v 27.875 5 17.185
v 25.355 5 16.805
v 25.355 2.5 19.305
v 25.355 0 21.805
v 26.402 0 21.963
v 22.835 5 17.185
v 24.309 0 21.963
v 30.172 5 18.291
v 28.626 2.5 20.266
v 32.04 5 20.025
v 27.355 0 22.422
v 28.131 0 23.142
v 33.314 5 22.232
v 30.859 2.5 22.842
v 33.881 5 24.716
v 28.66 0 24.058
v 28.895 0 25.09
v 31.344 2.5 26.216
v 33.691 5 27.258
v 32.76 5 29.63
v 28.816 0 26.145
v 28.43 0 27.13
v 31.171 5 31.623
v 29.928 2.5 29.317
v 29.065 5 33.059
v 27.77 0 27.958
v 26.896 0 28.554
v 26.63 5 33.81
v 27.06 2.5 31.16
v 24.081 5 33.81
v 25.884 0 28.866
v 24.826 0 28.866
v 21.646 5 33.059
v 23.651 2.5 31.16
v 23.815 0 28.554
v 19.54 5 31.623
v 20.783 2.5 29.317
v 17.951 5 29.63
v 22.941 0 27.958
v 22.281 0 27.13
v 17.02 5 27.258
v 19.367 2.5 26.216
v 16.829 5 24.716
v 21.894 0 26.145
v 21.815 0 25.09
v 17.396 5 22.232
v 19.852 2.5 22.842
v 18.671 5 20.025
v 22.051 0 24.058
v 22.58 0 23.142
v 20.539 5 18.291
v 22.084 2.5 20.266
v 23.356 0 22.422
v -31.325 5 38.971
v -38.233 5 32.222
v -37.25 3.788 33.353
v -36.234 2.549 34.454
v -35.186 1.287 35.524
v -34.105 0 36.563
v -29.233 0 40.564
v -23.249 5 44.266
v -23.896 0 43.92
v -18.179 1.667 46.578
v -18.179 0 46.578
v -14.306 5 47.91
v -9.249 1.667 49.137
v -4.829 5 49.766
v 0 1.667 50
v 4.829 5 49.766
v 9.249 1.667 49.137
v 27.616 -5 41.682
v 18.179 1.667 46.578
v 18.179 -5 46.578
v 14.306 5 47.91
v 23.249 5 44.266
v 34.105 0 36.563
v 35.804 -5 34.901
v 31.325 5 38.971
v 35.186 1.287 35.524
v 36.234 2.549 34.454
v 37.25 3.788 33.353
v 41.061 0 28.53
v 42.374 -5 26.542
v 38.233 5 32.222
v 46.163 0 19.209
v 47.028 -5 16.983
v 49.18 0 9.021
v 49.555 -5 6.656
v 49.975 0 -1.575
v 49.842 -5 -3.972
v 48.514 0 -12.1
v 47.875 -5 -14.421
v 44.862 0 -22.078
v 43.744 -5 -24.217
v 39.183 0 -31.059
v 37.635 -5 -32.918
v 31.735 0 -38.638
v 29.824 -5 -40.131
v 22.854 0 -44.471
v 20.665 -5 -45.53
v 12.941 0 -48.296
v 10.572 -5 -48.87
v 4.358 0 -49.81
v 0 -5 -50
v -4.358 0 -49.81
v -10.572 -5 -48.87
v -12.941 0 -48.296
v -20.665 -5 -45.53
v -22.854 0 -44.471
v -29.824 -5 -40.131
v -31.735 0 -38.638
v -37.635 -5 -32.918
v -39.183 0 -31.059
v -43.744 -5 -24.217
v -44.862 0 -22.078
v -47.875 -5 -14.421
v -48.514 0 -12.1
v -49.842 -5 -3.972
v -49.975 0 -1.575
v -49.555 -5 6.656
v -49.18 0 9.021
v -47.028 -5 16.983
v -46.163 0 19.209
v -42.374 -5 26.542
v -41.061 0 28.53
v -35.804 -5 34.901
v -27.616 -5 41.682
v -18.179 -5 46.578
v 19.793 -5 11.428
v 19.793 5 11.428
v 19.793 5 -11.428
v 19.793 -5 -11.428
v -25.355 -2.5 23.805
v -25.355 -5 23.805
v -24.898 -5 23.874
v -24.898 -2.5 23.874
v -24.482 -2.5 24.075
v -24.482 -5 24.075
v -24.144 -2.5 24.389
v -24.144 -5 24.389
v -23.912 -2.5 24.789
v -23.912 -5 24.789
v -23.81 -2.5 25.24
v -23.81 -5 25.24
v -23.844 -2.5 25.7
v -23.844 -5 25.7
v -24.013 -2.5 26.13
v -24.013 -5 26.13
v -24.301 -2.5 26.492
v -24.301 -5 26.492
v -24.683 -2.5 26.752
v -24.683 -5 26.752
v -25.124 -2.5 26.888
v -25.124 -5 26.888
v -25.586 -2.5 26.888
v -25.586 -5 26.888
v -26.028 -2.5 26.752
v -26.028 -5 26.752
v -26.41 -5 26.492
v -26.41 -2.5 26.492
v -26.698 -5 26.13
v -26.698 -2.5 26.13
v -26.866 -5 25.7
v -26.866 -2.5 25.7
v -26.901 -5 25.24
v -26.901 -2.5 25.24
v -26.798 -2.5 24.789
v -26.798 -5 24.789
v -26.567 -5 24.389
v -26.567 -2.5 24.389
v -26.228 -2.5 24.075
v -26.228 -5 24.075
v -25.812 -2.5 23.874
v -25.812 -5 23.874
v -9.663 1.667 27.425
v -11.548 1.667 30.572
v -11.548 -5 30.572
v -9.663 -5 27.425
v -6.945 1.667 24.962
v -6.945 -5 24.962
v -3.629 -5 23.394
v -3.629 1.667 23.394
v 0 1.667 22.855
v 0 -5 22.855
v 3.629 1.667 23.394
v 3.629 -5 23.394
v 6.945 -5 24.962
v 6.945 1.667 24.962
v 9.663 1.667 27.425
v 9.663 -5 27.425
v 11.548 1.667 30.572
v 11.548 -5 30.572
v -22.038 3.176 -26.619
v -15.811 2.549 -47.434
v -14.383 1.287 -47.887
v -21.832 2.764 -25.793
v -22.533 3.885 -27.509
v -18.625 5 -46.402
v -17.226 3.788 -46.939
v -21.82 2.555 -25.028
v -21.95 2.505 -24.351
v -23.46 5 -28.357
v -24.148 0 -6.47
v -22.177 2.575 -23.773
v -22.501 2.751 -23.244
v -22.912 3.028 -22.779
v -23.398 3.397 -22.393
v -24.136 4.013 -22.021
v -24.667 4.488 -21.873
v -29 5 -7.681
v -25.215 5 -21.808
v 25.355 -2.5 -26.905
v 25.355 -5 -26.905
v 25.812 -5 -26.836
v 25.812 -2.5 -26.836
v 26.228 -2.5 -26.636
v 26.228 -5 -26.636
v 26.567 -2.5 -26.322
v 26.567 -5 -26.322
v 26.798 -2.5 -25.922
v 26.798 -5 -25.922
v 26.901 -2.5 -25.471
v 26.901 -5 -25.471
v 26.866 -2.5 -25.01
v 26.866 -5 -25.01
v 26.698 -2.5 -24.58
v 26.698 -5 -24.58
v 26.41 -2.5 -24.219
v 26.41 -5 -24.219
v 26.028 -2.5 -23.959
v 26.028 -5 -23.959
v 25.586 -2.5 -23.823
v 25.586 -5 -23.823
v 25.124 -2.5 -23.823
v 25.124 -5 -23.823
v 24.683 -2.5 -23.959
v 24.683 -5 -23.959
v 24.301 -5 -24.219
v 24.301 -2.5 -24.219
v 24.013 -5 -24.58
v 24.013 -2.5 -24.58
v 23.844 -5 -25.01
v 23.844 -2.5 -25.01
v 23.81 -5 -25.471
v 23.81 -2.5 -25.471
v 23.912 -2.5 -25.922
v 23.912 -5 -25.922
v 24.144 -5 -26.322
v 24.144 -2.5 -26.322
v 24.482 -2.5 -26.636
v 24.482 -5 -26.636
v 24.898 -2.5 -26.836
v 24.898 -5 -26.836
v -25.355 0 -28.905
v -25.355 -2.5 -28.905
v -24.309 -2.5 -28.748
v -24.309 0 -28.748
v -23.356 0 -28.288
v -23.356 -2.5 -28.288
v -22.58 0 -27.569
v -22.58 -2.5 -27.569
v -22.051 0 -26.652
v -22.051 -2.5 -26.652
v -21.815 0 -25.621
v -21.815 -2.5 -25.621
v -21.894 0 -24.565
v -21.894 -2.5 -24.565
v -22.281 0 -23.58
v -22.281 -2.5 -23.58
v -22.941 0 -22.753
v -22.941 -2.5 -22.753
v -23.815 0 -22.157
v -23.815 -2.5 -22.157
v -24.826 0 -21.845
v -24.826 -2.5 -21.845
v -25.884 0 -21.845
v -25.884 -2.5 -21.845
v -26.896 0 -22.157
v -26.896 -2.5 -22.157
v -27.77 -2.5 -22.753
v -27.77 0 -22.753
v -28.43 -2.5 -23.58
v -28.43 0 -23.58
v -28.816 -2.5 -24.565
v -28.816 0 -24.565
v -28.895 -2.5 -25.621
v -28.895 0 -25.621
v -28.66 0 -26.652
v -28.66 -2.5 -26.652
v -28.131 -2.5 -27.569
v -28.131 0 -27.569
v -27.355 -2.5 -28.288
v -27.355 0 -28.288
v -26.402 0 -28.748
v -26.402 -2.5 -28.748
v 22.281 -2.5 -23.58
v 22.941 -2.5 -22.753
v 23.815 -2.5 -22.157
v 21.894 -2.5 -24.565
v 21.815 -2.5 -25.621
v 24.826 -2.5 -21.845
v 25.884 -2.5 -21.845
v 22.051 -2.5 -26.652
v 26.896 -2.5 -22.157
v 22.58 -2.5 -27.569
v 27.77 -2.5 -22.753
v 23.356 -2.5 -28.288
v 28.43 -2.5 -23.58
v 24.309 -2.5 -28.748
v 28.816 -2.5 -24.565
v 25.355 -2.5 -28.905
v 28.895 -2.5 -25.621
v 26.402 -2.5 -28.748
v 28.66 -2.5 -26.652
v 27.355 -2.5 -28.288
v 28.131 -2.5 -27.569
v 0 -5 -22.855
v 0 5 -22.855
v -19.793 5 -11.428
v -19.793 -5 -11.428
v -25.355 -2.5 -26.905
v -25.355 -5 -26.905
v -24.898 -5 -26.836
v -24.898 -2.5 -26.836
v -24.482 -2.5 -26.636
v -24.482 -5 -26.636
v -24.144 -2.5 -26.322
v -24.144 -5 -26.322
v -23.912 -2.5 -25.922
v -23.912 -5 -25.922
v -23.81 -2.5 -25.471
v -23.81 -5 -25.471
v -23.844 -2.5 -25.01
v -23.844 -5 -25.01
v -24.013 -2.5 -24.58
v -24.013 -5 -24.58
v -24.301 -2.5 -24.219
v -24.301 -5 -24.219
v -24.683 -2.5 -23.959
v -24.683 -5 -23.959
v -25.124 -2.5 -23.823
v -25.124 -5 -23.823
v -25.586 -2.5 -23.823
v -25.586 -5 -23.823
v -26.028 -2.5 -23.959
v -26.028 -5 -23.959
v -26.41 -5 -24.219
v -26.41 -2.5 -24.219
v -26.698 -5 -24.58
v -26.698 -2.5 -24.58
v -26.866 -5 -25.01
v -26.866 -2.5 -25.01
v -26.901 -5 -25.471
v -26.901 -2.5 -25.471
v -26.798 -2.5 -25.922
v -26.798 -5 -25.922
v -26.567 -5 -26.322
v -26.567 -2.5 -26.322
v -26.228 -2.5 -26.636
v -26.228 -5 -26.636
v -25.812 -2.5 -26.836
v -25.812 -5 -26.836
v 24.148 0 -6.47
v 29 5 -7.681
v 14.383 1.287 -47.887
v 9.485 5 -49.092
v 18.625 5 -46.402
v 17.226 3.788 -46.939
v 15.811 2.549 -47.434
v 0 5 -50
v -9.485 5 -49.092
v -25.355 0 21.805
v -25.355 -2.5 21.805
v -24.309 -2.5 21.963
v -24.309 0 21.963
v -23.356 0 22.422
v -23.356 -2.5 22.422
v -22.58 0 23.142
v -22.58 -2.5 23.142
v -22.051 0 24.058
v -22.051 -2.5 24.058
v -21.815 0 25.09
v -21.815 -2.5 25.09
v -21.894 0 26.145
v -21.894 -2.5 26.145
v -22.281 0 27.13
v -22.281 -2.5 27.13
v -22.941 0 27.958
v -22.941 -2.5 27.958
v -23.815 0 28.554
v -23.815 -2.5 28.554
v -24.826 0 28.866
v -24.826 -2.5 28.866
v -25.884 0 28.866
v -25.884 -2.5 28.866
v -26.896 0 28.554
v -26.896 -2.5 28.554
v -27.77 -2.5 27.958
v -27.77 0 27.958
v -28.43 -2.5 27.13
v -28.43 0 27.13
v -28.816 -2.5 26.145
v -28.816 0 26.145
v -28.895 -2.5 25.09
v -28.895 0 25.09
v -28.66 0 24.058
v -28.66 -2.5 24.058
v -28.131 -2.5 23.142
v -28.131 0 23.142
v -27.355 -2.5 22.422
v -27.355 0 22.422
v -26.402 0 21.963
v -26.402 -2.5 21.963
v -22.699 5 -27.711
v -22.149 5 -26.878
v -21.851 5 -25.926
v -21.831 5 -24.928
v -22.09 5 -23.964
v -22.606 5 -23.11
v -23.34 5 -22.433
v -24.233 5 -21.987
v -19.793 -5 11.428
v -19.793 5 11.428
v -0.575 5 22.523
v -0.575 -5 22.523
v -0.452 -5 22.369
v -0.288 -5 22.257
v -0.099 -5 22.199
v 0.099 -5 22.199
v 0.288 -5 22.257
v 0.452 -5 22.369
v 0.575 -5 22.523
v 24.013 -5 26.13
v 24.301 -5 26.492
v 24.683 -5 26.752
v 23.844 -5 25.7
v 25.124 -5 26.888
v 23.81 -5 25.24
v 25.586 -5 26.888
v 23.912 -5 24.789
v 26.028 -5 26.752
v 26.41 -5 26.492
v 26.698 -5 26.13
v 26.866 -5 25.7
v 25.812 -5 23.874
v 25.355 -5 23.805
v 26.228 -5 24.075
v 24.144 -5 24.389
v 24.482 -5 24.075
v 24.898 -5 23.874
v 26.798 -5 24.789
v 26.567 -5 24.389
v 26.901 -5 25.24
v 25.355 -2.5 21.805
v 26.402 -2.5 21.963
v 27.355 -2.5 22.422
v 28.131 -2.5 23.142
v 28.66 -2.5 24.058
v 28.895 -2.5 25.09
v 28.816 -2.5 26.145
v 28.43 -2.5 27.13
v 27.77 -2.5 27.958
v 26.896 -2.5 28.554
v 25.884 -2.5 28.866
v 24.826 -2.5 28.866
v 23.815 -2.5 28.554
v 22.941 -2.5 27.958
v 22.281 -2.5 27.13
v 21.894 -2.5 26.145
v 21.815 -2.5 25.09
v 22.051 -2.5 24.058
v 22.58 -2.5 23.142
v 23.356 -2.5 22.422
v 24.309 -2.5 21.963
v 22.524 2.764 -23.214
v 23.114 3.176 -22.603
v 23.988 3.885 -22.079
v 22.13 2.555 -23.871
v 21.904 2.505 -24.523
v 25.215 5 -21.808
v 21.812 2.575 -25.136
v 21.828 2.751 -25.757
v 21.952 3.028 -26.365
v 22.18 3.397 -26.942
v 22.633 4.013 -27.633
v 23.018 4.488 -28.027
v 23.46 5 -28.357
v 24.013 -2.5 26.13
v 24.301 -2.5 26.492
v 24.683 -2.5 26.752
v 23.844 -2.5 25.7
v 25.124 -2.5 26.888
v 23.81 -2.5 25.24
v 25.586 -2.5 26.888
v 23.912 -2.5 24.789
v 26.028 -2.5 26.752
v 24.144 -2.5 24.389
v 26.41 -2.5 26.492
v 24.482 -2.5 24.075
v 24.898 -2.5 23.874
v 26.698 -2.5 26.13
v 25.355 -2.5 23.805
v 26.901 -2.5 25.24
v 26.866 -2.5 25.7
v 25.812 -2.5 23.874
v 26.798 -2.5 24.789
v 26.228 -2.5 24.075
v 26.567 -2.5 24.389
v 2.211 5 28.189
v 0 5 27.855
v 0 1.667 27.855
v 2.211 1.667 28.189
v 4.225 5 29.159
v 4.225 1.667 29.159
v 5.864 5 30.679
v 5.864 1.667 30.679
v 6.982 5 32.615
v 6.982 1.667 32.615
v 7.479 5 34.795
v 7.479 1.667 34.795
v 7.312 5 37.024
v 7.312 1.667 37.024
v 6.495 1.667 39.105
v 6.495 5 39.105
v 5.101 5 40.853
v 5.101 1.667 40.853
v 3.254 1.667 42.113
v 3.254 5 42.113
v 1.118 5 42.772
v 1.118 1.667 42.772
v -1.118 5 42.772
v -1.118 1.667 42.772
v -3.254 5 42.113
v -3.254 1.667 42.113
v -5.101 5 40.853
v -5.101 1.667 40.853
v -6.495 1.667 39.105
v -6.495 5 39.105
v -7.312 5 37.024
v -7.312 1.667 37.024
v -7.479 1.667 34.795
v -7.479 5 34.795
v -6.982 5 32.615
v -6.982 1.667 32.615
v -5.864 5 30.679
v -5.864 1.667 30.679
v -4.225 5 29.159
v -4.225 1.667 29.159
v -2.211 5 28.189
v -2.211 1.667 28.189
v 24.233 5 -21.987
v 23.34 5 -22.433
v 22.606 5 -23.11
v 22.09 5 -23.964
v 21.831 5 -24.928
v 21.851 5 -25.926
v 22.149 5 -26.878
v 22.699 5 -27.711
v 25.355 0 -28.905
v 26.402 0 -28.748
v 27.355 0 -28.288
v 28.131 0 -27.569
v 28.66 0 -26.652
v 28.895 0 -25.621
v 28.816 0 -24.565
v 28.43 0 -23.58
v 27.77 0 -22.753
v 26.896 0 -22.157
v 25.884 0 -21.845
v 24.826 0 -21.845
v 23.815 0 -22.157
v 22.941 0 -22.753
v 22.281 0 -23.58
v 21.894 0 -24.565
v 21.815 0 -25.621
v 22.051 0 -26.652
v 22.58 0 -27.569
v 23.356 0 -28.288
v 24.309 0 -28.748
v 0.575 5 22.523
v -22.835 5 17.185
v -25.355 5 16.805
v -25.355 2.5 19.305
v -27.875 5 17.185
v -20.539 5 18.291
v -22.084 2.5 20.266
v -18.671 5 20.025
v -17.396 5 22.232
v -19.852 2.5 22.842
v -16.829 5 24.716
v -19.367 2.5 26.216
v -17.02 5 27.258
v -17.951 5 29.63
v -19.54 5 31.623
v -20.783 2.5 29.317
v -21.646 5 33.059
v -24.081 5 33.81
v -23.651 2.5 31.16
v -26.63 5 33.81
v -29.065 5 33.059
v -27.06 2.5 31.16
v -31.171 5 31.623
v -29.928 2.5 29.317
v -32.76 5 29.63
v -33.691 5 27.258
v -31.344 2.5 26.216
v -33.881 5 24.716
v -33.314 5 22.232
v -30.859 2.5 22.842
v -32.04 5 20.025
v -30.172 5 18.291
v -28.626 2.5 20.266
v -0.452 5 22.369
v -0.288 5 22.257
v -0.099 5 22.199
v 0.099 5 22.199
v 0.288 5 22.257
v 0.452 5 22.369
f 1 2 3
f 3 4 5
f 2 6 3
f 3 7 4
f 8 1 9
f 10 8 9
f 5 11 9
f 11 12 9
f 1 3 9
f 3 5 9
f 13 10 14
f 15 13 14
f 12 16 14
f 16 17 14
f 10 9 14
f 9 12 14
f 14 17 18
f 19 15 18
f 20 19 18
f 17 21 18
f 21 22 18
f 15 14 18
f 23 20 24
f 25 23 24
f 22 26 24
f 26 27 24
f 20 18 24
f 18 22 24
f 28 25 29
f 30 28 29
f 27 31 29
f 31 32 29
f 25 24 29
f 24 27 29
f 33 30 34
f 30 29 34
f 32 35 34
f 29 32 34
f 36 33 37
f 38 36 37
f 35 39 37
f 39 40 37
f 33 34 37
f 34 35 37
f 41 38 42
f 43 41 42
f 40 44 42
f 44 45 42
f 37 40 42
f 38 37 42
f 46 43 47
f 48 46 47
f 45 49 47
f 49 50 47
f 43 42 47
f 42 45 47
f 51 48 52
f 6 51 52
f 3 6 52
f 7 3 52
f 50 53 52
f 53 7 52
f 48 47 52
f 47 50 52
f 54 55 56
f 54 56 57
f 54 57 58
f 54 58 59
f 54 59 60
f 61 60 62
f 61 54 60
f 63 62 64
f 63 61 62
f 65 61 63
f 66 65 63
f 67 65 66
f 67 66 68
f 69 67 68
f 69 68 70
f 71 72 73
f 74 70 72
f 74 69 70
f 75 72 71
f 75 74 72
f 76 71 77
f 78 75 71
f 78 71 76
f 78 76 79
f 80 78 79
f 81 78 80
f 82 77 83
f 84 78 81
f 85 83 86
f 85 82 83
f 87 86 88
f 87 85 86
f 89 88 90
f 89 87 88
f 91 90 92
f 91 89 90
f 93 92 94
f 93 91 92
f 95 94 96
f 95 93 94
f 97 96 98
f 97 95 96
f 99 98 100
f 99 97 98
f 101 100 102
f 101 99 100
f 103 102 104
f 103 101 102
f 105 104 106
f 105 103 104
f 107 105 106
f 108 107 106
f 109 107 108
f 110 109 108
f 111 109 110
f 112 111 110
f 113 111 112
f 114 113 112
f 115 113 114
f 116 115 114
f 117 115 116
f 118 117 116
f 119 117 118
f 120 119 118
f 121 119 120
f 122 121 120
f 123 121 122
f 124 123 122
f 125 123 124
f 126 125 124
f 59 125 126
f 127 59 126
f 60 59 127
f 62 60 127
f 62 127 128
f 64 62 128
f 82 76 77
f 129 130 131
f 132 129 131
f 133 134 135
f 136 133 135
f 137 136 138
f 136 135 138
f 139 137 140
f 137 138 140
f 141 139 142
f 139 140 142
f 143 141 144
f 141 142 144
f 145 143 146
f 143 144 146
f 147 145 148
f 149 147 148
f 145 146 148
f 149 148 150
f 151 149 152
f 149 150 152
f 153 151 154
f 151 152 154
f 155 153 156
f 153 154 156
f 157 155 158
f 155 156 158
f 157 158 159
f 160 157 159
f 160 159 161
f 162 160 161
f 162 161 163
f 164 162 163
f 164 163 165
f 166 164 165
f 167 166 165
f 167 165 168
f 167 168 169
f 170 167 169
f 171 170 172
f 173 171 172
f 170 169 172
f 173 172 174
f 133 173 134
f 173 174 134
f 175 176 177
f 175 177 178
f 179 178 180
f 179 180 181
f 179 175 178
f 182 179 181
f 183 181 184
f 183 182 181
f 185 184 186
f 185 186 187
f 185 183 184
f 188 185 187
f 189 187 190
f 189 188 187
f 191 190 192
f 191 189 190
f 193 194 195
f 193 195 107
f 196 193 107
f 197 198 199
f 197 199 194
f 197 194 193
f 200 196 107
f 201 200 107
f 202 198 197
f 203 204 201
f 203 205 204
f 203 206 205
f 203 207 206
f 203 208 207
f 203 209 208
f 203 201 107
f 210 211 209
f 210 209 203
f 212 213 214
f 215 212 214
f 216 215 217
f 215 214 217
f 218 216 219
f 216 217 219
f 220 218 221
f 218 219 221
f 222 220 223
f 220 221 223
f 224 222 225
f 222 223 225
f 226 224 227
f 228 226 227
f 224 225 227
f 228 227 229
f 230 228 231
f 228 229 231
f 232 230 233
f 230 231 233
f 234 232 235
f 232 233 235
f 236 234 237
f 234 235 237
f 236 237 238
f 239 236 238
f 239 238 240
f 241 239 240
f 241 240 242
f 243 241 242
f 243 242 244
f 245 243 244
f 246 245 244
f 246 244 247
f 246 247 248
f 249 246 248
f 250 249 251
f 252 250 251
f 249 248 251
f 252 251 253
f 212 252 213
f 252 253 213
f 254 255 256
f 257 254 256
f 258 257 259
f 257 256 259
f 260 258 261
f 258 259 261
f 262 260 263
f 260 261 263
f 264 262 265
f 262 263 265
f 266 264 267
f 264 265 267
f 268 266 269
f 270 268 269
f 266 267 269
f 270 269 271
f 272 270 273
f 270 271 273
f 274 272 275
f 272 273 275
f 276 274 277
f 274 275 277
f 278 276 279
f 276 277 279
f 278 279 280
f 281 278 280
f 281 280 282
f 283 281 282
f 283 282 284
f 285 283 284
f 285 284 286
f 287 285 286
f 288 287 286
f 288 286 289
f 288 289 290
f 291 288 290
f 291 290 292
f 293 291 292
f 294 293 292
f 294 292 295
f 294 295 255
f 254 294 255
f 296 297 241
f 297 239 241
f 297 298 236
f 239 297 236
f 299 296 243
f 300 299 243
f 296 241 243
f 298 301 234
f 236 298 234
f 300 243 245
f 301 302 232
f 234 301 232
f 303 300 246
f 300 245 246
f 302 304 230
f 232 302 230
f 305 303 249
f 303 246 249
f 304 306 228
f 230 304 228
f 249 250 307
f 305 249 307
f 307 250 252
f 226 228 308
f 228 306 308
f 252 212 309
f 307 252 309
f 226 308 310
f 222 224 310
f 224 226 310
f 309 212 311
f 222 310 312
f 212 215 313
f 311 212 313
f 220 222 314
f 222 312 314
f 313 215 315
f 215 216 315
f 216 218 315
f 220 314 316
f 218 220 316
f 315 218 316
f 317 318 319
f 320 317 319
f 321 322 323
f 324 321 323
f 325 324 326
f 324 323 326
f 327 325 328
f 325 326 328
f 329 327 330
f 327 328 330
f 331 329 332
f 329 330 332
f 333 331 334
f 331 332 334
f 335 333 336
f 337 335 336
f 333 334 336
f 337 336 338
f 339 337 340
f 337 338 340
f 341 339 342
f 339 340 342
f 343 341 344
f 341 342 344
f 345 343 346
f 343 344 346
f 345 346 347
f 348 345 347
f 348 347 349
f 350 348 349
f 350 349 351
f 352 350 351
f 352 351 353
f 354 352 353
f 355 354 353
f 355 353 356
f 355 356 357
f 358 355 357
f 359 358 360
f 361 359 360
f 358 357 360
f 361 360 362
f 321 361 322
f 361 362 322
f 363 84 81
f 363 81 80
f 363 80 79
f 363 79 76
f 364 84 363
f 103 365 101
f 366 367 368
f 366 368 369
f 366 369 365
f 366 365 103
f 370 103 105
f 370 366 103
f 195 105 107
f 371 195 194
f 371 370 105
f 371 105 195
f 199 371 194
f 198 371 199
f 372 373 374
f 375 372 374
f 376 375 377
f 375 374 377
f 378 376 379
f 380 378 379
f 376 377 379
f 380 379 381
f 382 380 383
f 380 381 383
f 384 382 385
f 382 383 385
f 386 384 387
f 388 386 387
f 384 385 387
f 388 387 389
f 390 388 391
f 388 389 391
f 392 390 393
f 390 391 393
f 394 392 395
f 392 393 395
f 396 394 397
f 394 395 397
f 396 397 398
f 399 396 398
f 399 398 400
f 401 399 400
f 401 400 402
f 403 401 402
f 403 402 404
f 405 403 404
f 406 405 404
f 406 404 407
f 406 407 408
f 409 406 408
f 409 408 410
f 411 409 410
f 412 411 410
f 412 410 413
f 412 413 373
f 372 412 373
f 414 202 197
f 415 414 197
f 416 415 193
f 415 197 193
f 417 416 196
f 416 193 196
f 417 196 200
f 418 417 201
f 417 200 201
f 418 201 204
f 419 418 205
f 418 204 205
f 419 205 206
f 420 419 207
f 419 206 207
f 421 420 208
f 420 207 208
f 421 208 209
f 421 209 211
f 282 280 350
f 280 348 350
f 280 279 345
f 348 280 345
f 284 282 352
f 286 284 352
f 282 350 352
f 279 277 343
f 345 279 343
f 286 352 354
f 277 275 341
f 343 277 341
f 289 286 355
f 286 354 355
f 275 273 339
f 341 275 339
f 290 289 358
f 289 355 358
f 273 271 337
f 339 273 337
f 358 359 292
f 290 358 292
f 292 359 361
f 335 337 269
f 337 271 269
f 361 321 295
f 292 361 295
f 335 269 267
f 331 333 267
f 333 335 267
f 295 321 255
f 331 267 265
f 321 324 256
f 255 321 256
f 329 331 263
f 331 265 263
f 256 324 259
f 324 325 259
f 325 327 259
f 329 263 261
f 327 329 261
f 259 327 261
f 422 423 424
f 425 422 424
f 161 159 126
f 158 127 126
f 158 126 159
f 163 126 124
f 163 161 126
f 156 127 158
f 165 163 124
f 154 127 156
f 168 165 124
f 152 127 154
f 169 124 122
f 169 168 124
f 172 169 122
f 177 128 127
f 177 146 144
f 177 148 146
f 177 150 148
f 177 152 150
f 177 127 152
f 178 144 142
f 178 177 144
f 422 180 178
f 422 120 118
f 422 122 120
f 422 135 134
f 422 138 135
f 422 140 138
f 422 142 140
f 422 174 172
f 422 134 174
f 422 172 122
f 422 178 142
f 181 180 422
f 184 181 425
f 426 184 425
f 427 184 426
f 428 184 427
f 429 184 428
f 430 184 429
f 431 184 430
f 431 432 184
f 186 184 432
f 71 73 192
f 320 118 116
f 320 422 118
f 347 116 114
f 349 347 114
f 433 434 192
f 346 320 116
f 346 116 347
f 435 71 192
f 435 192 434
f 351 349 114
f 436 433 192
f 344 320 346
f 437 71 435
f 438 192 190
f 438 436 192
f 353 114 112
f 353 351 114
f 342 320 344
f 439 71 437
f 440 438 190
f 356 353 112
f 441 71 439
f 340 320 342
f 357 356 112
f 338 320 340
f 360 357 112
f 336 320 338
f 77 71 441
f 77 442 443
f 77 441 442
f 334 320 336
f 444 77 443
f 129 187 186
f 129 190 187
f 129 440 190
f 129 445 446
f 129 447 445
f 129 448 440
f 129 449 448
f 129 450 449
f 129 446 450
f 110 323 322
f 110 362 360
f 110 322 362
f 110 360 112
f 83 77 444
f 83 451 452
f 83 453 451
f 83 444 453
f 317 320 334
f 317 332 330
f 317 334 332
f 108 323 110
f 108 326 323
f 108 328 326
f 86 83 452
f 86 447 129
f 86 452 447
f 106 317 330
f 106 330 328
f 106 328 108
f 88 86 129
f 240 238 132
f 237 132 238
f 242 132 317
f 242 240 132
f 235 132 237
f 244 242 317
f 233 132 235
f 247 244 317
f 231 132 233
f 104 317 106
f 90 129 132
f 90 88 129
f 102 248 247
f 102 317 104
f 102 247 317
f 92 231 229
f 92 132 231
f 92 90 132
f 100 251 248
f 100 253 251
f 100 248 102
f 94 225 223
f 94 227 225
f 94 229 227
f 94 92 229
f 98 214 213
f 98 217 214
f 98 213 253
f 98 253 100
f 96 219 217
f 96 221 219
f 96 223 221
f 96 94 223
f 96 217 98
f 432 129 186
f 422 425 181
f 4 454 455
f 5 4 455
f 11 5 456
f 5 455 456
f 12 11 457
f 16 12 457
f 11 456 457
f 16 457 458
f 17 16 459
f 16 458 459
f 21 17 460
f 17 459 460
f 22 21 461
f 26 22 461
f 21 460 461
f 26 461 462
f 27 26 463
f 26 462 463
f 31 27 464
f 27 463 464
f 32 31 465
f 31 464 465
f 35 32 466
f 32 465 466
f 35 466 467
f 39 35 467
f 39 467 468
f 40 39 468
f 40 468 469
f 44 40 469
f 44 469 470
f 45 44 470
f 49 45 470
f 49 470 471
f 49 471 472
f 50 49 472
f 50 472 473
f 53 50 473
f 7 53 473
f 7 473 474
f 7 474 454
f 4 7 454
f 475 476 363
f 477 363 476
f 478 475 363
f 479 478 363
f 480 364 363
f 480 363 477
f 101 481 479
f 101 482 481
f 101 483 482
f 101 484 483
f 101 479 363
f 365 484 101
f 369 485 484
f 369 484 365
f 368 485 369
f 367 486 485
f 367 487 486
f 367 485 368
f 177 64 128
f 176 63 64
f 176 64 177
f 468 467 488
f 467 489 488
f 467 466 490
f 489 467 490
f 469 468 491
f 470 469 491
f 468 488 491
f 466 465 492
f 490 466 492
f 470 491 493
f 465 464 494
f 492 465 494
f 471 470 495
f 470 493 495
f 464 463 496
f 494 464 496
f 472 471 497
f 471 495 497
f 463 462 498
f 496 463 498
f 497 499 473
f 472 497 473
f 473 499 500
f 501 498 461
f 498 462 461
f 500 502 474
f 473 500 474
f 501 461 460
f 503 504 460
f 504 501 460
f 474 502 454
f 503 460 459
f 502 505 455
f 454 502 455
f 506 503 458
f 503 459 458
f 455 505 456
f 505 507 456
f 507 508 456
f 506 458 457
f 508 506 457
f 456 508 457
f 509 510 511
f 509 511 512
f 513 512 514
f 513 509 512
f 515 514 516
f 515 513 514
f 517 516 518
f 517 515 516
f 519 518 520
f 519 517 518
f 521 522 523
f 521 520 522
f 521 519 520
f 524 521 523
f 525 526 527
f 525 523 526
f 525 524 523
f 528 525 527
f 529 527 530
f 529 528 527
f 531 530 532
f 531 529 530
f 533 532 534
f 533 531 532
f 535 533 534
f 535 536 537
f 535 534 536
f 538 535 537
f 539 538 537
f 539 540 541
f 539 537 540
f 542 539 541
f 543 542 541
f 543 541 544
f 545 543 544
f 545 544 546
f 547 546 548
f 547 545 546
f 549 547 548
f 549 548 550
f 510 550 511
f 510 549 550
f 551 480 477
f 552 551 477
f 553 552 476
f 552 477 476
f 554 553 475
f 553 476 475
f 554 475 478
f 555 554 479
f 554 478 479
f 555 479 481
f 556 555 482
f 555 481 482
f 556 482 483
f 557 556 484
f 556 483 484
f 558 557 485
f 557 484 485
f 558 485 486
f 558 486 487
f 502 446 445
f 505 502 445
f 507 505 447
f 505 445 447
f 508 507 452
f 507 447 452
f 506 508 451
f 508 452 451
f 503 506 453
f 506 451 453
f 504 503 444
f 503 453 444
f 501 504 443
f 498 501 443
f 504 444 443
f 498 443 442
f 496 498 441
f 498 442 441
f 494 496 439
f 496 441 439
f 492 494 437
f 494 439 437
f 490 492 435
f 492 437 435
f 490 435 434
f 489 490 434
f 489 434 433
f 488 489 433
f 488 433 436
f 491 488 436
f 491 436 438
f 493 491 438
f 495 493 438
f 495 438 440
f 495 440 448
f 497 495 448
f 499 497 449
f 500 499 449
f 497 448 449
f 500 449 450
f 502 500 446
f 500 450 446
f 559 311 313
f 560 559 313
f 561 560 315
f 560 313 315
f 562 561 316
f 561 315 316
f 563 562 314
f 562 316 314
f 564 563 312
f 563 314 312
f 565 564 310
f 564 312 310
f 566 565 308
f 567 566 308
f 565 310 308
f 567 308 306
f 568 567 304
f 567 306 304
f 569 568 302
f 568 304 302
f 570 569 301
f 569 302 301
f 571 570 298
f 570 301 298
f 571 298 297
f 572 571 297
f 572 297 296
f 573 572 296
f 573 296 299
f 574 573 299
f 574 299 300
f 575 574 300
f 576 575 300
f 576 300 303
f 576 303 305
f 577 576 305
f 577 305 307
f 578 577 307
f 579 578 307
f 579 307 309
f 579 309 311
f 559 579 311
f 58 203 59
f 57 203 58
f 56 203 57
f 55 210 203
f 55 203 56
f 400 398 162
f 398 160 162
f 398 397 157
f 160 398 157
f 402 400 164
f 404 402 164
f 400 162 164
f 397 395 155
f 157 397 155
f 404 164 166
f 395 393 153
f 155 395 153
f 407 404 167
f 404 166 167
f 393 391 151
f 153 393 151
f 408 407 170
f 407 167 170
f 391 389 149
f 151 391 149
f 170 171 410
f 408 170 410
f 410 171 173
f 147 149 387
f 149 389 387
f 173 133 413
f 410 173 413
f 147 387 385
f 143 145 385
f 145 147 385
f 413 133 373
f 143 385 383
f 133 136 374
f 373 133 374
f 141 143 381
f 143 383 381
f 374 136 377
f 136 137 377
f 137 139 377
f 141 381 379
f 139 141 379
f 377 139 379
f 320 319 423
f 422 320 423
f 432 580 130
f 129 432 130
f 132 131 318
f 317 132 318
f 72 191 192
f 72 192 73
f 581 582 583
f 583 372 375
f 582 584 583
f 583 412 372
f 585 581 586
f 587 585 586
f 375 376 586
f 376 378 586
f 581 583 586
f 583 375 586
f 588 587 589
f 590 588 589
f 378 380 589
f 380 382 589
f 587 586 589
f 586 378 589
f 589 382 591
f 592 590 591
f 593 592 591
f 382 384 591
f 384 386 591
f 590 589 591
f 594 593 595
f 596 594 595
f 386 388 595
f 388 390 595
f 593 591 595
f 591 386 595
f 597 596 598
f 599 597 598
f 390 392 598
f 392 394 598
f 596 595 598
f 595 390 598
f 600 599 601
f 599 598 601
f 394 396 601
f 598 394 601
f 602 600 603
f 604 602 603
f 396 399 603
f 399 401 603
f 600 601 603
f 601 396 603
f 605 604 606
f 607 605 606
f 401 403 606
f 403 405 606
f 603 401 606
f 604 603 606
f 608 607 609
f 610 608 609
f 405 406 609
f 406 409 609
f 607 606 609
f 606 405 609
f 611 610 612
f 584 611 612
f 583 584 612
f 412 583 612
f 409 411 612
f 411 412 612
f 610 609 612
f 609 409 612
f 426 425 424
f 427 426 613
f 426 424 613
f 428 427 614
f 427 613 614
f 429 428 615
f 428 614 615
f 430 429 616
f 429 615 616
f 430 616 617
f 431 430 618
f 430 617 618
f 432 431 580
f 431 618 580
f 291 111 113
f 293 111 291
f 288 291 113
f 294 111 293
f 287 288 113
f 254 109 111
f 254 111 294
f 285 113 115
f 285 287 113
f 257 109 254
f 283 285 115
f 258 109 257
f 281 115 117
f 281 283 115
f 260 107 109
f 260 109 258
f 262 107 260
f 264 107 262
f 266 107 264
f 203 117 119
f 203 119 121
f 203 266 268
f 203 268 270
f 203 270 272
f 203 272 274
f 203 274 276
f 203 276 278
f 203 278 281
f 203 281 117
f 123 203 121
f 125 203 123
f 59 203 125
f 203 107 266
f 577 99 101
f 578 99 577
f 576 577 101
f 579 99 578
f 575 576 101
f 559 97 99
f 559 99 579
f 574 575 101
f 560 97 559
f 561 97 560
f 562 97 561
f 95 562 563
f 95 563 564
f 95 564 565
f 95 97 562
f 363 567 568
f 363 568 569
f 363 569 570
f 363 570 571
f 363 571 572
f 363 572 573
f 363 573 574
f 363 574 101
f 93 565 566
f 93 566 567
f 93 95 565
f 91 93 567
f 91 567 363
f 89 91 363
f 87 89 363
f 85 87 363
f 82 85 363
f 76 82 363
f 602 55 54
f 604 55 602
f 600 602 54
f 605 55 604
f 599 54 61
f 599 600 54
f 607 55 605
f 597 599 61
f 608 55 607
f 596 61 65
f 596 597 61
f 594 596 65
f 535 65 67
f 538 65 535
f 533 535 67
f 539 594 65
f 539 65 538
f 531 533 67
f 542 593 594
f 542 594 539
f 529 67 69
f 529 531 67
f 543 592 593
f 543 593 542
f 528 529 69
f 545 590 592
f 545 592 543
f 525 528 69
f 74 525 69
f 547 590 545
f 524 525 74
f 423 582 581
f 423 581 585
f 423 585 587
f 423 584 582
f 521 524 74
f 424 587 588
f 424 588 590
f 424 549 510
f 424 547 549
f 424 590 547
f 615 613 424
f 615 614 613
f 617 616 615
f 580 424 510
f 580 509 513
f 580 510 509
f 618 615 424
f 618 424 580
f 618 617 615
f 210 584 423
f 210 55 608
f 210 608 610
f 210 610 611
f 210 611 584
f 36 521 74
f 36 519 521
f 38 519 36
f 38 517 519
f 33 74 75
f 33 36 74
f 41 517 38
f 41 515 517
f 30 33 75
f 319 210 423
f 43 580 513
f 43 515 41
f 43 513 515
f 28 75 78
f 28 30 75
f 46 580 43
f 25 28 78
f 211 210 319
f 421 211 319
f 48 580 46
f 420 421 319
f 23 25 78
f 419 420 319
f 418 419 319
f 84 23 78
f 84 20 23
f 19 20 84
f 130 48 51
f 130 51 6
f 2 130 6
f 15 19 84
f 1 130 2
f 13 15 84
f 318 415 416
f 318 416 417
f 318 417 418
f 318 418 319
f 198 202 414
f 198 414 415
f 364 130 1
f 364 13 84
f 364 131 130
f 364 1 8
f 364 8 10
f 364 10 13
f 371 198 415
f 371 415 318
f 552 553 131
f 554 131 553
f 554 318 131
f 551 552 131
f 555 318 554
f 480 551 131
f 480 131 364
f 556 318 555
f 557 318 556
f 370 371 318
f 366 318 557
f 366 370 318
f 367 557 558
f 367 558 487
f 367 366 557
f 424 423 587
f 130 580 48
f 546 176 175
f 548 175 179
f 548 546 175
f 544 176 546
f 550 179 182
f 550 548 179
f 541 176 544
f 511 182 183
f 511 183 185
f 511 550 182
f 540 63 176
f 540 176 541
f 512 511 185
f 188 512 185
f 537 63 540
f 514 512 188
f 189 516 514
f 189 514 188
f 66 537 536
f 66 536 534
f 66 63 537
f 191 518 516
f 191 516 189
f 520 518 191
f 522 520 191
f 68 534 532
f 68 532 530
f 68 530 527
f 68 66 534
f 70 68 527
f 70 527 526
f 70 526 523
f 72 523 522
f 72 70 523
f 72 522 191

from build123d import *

# Parameters (mm, degrees)
SKETCH1_R               = 50
BOSS_EXTRUDE1_DEPTH     = 5
BOSS_EXTRUDE3_START     = 5
BOSS_EXTRUDE3_DEPTH     = 5
DRAFT2_ANGLE            = -45
CUT_EXTRUDE3_DEPTH      = 72.414284285
CUT_EXTRUDE3_DEPTH_BACK = 72.414284285
SKETCH3_R               = 7.5
CUT_EXTRUDE5_START      = -6.666666667
CUT_EXTRUDE5_DEPTH      = 6.666666667
SKETCH5_R               = 3.55
SKETCH5_R_2             = 1.55
CUT_EXTRUDE6_DEPTH      = 72.414284285
SKETCH5_3_R             = 3.55
SKETCH5_3_R_2           = 1.55
BOSS_EXTRUDE4_DEPTH     = 2.5
CUT_EXTRUDE8_DEPTH      = 72.414284285
CHAMFER1_SIZE           = 5


with BuildPart() as part:
    # Sketch1 → Boss-Extrude1 (new body)
    with BuildSketch(Plane(origin=(0, 0, 0), x_dir=(1, 0, 0), z_dir=(0, 1, 0))):
        with Locations(Location((0, 0, 0), (0, 0, 270))):
            Circle(SKETCH1_R)
    extrude(amount=-BOSS_EXTRUDE1_DEPTH)

    # Sketch1<6> → Boss-Extrude3 (add)
    with BuildSketch(Plane(origin=(0, 0, 0), x_dir=(1, 0, 0), z_dir=(0, 1, 0)).offset(BOSS_EXTRUDE3_START)):
        with BuildLine():
            Line((-24.148145658, 6.470476128), (-34.10533906, -36.562629112))
            ThreePointArc((-34.10533906, -36.562629112), (0, -50), (34.10533906, -36.562629112))
            Line((34.10533906, -36.562629112), (24.148145658, 6.470476128))
            Line((24.148145658, 6.470476128), (12.940952256, 48.296291314))
            ThreePointArc((12.940952256, 48.296291314), (0, 50), (-12.940952256, 48.296291314))
            Line((-12.940952256, 48.296291314), (-24.148145658, 6.470476128))
        make_face()
    extrude(amount=-BOSS_EXTRUDE3_DEPTH)

    # Draft2
    draft2_faces = [part.faces().sort_by_distance(p)[0] for p in [
        (-29.126742359, 2.5, 15.046076492),
        (-18.544548957, 2.5, -27.383383721),
        (18.544548957, 2.5, -27.383383721),
        (29.126742359, 2.5, 15.046076492),
    ]]
    draft(draft2_faces, Plane.ZX, DRAFT2_ANGLE)

    # Sketch3 → Cut-Extrude3 (cut, two sides: drawn at the far end of the back side and taken through both)
    with BuildSketch(Plane.XZ.offset(5).offset(-CUT_EXTRUDE3_DEPTH_BACK)):
        with Locations(Location((0, 35.355339059, 0), (0, 0, 270))):
            Circle(SKETCH3_R)
    extrude(amount=CUT_EXTRUDE3_DEPTH + CUT_EXTRUDE3_DEPTH_BACK, mode=Mode.SUBTRACT)

    # Sketch4 → Cut-Extrude5 (cut)
    with BuildSketch(Plane.XZ.offset(5).offset(CUT_EXTRUDE5_START)):
        with BuildLine():
            ThreePointArc((18.178606224, 46.578302628), (0, 50), (-18.178606224, 46.578302628))
            Line((-18.178606224, 46.578302628), (-11.548494202, 30.571796264))
            ThreePointArc((-11.548494202, 30.571796264), (3.3e-08, 22.855339059), (11.548494227, 30.571796326))
            Line((11.548494227, 30.571796326), (18.178606224, 46.578302628))
        make_face()
    extrude(amount=CUT_EXTRUDE5_DEPTH, mode=Mode.SUBTRACT)

    # Sketch5 → Cut-Extrude6 (cut, through all)
    # profile 1 of 8: a face of its own
    with BuildSketch(Plane.XZ.offset(5)):
        with Locations(Location((25.355339059, 25.355339059, 0), (0, 0, 270))):
            Circle(SKETCH5_R)
        with Locations((25.355339059, 25.355339059)):
            Circle(SKETCH5_R_2, mode=Mode.SUBTRACT)
    # profile 2 of 8: a face of its own
    with BuildSketch(Plane.XZ.offset(5)):
        with Locations((25.355339059, 25.355339059)):
            Circle(SKETCH5_R_2)
    # profile 3 of 8: a face of its own
    with BuildSketch(Plane.XZ.offset(5)):
        with Locations(Location((25.355339059, -25.355339059, 0), (0, 0, 270))):
            Circle(SKETCH5_R)
        with Locations((25.355339059, -25.355339059)):
            Circle(SKETCH5_R_2, mode=Mode.SUBTRACT)
    # profile 4 of 8: a face of its own
    with BuildSketch(Plane.XZ.offset(5)):
        with Locations((25.355339059, -25.355339059)):
            Circle(SKETCH5_R_2)
    # profile 5 of 8: a face of its own
    with BuildSketch(Plane.XZ.offset(5)):
        with Locations(Location((-25.355339059, -25.355339059, 0), (0, 0, 270))):
            Circle(SKETCH5_R)
        with Locations((-25.355339059, -25.355339059)):
            Circle(SKETCH5_R_2, mode=Mode.SUBTRACT)
    # profile 6 of 8: a face of its own
    with BuildSketch(Plane.XZ.offset(5)):
        with Locations((-25.355339059, -25.355339059)):
            Circle(SKETCH5_R_2)
    # profile 7 of 8: a face of its own
    with BuildSketch(Plane.XZ.offset(5)):
        with Locations(Location((-25.355339059, 25.355339059, 0), (0, 0, 270))):
            Circle(SKETCH5_R)
        with Locations((-25.355339059, 25.355339059)):
            Circle(SKETCH5_R_2, mode=Mode.SUBTRACT)
    # profile 8 of 8: a face of its own
    with BuildSketch(Plane.XZ.offset(5)):
        with Locations((-25.355339059, 25.355339059)):
            Circle(SKETCH5_R_2)
    extrude(amount=-CUT_EXTRUDE6_DEPTH, mode=Mode.SUBTRACT)

    # Sketch5<3> → Boss-Extrude4 (add)
    # profile 1 of 4: a face of its own
    with BuildSketch(Plane.XZ.offset(5)):
        with Locations(Location((25.355339059, -25.355339059, 0), (0, 0, 270))):
            Circle(SKETCH5_3_R)
        with Locations(Location((25.355339059, -25.355339059, 0), (0, 0, 270))):
            Circle(SKETCH5_3_R_2, mode=Mode.SUBTRACT)
    # profile 2 of 4: a face of its own
    with BuildSketch(Plane.XZ.offset(5)):
        with Locations(Location((-25.355339059, -25.355339059, 0), (0, 0, 270))):
            Circle(SKETCH5_3_R)
        with Locations(Location((-25.355339059, -25.355339059, 0), (0, 0, 270))):
            Circle(SKETCH5_3_R_2, mode=Mode.SUBTRACT)
    # profile 3 of 4: a face of its own
    with BuildSketch(Plane.XZ.offset(5)):
        with Locations(Location((25.355339059, 25.355339059, 0), (0, 0, 270))):
            Circle(SKETCH5_3_R)
        with Locations(Location((25.355339059, 25.355339059, 0), (0, 0, 270))):
            Circle(SKETCH5_3_R_2, mode=Mode.SUBTRACT)
    # profile 4 of 4: a face of its own
    with BuildSketch(Plane.XZ.offset(5)):
        with Locations(Location((-25.355339059, 25.355339059, 0), (0, 0, 270))):
            Circle(SKETCH5_3_R)
        with Locations(Location((-25.355339059, 25.355339059, 0), (0, 0, 270))):
            Circle(SKETCH5_3_R_2, mode=Mode.SUBTRACT)
    extrude(amount=-BOSS_EXTRUDE4_DEPTH)

    # Sketch6 → Cut-Extrude8 (cut, through all)
    with BuildSketch(Plane(origin=(0, 5, 0), x_dir=(1, 0, 0), z_dir=(0, 1, 0))):
        with BuildLine():
            ThreePointArc((-0.574925376, -22.523405739), (0, -22.191472419), (0.574925376, -22.523405739))
            Line((0.574925376, -22.523405739), (19.793304237, -11.42766953))
            Line((19.793304237, -11.42766953), (19.793304237, 11.42766953))
            Line((19.793304237, 11.42766953), (0, 22.855339059))
            Line((0, 22.855339059), (-19.793304237, 11.42766953))
            Line((-19.793304237, 11.42766953), (-19.793304237, -11.42766953))
            Line((-19.793304237, -11.42766953), (-0.574925376, -22.523405739))
        make_face()
    extrude(amount=-CUT_EXTRUDE8_DEPTH, mode=Mode.SUBTRACT)

    # Chamfer1
    chamfer1_edges = [part.edges().sort_by_distance(p)[0] for p in [
        (-25.355339059, 5, 28.905339059),
        (25.355339059, 5, 28.905339059),
    ]]
    chamfer(chamfer1_edges, length=CHAMFER1_SIZE)


solid = part.part
